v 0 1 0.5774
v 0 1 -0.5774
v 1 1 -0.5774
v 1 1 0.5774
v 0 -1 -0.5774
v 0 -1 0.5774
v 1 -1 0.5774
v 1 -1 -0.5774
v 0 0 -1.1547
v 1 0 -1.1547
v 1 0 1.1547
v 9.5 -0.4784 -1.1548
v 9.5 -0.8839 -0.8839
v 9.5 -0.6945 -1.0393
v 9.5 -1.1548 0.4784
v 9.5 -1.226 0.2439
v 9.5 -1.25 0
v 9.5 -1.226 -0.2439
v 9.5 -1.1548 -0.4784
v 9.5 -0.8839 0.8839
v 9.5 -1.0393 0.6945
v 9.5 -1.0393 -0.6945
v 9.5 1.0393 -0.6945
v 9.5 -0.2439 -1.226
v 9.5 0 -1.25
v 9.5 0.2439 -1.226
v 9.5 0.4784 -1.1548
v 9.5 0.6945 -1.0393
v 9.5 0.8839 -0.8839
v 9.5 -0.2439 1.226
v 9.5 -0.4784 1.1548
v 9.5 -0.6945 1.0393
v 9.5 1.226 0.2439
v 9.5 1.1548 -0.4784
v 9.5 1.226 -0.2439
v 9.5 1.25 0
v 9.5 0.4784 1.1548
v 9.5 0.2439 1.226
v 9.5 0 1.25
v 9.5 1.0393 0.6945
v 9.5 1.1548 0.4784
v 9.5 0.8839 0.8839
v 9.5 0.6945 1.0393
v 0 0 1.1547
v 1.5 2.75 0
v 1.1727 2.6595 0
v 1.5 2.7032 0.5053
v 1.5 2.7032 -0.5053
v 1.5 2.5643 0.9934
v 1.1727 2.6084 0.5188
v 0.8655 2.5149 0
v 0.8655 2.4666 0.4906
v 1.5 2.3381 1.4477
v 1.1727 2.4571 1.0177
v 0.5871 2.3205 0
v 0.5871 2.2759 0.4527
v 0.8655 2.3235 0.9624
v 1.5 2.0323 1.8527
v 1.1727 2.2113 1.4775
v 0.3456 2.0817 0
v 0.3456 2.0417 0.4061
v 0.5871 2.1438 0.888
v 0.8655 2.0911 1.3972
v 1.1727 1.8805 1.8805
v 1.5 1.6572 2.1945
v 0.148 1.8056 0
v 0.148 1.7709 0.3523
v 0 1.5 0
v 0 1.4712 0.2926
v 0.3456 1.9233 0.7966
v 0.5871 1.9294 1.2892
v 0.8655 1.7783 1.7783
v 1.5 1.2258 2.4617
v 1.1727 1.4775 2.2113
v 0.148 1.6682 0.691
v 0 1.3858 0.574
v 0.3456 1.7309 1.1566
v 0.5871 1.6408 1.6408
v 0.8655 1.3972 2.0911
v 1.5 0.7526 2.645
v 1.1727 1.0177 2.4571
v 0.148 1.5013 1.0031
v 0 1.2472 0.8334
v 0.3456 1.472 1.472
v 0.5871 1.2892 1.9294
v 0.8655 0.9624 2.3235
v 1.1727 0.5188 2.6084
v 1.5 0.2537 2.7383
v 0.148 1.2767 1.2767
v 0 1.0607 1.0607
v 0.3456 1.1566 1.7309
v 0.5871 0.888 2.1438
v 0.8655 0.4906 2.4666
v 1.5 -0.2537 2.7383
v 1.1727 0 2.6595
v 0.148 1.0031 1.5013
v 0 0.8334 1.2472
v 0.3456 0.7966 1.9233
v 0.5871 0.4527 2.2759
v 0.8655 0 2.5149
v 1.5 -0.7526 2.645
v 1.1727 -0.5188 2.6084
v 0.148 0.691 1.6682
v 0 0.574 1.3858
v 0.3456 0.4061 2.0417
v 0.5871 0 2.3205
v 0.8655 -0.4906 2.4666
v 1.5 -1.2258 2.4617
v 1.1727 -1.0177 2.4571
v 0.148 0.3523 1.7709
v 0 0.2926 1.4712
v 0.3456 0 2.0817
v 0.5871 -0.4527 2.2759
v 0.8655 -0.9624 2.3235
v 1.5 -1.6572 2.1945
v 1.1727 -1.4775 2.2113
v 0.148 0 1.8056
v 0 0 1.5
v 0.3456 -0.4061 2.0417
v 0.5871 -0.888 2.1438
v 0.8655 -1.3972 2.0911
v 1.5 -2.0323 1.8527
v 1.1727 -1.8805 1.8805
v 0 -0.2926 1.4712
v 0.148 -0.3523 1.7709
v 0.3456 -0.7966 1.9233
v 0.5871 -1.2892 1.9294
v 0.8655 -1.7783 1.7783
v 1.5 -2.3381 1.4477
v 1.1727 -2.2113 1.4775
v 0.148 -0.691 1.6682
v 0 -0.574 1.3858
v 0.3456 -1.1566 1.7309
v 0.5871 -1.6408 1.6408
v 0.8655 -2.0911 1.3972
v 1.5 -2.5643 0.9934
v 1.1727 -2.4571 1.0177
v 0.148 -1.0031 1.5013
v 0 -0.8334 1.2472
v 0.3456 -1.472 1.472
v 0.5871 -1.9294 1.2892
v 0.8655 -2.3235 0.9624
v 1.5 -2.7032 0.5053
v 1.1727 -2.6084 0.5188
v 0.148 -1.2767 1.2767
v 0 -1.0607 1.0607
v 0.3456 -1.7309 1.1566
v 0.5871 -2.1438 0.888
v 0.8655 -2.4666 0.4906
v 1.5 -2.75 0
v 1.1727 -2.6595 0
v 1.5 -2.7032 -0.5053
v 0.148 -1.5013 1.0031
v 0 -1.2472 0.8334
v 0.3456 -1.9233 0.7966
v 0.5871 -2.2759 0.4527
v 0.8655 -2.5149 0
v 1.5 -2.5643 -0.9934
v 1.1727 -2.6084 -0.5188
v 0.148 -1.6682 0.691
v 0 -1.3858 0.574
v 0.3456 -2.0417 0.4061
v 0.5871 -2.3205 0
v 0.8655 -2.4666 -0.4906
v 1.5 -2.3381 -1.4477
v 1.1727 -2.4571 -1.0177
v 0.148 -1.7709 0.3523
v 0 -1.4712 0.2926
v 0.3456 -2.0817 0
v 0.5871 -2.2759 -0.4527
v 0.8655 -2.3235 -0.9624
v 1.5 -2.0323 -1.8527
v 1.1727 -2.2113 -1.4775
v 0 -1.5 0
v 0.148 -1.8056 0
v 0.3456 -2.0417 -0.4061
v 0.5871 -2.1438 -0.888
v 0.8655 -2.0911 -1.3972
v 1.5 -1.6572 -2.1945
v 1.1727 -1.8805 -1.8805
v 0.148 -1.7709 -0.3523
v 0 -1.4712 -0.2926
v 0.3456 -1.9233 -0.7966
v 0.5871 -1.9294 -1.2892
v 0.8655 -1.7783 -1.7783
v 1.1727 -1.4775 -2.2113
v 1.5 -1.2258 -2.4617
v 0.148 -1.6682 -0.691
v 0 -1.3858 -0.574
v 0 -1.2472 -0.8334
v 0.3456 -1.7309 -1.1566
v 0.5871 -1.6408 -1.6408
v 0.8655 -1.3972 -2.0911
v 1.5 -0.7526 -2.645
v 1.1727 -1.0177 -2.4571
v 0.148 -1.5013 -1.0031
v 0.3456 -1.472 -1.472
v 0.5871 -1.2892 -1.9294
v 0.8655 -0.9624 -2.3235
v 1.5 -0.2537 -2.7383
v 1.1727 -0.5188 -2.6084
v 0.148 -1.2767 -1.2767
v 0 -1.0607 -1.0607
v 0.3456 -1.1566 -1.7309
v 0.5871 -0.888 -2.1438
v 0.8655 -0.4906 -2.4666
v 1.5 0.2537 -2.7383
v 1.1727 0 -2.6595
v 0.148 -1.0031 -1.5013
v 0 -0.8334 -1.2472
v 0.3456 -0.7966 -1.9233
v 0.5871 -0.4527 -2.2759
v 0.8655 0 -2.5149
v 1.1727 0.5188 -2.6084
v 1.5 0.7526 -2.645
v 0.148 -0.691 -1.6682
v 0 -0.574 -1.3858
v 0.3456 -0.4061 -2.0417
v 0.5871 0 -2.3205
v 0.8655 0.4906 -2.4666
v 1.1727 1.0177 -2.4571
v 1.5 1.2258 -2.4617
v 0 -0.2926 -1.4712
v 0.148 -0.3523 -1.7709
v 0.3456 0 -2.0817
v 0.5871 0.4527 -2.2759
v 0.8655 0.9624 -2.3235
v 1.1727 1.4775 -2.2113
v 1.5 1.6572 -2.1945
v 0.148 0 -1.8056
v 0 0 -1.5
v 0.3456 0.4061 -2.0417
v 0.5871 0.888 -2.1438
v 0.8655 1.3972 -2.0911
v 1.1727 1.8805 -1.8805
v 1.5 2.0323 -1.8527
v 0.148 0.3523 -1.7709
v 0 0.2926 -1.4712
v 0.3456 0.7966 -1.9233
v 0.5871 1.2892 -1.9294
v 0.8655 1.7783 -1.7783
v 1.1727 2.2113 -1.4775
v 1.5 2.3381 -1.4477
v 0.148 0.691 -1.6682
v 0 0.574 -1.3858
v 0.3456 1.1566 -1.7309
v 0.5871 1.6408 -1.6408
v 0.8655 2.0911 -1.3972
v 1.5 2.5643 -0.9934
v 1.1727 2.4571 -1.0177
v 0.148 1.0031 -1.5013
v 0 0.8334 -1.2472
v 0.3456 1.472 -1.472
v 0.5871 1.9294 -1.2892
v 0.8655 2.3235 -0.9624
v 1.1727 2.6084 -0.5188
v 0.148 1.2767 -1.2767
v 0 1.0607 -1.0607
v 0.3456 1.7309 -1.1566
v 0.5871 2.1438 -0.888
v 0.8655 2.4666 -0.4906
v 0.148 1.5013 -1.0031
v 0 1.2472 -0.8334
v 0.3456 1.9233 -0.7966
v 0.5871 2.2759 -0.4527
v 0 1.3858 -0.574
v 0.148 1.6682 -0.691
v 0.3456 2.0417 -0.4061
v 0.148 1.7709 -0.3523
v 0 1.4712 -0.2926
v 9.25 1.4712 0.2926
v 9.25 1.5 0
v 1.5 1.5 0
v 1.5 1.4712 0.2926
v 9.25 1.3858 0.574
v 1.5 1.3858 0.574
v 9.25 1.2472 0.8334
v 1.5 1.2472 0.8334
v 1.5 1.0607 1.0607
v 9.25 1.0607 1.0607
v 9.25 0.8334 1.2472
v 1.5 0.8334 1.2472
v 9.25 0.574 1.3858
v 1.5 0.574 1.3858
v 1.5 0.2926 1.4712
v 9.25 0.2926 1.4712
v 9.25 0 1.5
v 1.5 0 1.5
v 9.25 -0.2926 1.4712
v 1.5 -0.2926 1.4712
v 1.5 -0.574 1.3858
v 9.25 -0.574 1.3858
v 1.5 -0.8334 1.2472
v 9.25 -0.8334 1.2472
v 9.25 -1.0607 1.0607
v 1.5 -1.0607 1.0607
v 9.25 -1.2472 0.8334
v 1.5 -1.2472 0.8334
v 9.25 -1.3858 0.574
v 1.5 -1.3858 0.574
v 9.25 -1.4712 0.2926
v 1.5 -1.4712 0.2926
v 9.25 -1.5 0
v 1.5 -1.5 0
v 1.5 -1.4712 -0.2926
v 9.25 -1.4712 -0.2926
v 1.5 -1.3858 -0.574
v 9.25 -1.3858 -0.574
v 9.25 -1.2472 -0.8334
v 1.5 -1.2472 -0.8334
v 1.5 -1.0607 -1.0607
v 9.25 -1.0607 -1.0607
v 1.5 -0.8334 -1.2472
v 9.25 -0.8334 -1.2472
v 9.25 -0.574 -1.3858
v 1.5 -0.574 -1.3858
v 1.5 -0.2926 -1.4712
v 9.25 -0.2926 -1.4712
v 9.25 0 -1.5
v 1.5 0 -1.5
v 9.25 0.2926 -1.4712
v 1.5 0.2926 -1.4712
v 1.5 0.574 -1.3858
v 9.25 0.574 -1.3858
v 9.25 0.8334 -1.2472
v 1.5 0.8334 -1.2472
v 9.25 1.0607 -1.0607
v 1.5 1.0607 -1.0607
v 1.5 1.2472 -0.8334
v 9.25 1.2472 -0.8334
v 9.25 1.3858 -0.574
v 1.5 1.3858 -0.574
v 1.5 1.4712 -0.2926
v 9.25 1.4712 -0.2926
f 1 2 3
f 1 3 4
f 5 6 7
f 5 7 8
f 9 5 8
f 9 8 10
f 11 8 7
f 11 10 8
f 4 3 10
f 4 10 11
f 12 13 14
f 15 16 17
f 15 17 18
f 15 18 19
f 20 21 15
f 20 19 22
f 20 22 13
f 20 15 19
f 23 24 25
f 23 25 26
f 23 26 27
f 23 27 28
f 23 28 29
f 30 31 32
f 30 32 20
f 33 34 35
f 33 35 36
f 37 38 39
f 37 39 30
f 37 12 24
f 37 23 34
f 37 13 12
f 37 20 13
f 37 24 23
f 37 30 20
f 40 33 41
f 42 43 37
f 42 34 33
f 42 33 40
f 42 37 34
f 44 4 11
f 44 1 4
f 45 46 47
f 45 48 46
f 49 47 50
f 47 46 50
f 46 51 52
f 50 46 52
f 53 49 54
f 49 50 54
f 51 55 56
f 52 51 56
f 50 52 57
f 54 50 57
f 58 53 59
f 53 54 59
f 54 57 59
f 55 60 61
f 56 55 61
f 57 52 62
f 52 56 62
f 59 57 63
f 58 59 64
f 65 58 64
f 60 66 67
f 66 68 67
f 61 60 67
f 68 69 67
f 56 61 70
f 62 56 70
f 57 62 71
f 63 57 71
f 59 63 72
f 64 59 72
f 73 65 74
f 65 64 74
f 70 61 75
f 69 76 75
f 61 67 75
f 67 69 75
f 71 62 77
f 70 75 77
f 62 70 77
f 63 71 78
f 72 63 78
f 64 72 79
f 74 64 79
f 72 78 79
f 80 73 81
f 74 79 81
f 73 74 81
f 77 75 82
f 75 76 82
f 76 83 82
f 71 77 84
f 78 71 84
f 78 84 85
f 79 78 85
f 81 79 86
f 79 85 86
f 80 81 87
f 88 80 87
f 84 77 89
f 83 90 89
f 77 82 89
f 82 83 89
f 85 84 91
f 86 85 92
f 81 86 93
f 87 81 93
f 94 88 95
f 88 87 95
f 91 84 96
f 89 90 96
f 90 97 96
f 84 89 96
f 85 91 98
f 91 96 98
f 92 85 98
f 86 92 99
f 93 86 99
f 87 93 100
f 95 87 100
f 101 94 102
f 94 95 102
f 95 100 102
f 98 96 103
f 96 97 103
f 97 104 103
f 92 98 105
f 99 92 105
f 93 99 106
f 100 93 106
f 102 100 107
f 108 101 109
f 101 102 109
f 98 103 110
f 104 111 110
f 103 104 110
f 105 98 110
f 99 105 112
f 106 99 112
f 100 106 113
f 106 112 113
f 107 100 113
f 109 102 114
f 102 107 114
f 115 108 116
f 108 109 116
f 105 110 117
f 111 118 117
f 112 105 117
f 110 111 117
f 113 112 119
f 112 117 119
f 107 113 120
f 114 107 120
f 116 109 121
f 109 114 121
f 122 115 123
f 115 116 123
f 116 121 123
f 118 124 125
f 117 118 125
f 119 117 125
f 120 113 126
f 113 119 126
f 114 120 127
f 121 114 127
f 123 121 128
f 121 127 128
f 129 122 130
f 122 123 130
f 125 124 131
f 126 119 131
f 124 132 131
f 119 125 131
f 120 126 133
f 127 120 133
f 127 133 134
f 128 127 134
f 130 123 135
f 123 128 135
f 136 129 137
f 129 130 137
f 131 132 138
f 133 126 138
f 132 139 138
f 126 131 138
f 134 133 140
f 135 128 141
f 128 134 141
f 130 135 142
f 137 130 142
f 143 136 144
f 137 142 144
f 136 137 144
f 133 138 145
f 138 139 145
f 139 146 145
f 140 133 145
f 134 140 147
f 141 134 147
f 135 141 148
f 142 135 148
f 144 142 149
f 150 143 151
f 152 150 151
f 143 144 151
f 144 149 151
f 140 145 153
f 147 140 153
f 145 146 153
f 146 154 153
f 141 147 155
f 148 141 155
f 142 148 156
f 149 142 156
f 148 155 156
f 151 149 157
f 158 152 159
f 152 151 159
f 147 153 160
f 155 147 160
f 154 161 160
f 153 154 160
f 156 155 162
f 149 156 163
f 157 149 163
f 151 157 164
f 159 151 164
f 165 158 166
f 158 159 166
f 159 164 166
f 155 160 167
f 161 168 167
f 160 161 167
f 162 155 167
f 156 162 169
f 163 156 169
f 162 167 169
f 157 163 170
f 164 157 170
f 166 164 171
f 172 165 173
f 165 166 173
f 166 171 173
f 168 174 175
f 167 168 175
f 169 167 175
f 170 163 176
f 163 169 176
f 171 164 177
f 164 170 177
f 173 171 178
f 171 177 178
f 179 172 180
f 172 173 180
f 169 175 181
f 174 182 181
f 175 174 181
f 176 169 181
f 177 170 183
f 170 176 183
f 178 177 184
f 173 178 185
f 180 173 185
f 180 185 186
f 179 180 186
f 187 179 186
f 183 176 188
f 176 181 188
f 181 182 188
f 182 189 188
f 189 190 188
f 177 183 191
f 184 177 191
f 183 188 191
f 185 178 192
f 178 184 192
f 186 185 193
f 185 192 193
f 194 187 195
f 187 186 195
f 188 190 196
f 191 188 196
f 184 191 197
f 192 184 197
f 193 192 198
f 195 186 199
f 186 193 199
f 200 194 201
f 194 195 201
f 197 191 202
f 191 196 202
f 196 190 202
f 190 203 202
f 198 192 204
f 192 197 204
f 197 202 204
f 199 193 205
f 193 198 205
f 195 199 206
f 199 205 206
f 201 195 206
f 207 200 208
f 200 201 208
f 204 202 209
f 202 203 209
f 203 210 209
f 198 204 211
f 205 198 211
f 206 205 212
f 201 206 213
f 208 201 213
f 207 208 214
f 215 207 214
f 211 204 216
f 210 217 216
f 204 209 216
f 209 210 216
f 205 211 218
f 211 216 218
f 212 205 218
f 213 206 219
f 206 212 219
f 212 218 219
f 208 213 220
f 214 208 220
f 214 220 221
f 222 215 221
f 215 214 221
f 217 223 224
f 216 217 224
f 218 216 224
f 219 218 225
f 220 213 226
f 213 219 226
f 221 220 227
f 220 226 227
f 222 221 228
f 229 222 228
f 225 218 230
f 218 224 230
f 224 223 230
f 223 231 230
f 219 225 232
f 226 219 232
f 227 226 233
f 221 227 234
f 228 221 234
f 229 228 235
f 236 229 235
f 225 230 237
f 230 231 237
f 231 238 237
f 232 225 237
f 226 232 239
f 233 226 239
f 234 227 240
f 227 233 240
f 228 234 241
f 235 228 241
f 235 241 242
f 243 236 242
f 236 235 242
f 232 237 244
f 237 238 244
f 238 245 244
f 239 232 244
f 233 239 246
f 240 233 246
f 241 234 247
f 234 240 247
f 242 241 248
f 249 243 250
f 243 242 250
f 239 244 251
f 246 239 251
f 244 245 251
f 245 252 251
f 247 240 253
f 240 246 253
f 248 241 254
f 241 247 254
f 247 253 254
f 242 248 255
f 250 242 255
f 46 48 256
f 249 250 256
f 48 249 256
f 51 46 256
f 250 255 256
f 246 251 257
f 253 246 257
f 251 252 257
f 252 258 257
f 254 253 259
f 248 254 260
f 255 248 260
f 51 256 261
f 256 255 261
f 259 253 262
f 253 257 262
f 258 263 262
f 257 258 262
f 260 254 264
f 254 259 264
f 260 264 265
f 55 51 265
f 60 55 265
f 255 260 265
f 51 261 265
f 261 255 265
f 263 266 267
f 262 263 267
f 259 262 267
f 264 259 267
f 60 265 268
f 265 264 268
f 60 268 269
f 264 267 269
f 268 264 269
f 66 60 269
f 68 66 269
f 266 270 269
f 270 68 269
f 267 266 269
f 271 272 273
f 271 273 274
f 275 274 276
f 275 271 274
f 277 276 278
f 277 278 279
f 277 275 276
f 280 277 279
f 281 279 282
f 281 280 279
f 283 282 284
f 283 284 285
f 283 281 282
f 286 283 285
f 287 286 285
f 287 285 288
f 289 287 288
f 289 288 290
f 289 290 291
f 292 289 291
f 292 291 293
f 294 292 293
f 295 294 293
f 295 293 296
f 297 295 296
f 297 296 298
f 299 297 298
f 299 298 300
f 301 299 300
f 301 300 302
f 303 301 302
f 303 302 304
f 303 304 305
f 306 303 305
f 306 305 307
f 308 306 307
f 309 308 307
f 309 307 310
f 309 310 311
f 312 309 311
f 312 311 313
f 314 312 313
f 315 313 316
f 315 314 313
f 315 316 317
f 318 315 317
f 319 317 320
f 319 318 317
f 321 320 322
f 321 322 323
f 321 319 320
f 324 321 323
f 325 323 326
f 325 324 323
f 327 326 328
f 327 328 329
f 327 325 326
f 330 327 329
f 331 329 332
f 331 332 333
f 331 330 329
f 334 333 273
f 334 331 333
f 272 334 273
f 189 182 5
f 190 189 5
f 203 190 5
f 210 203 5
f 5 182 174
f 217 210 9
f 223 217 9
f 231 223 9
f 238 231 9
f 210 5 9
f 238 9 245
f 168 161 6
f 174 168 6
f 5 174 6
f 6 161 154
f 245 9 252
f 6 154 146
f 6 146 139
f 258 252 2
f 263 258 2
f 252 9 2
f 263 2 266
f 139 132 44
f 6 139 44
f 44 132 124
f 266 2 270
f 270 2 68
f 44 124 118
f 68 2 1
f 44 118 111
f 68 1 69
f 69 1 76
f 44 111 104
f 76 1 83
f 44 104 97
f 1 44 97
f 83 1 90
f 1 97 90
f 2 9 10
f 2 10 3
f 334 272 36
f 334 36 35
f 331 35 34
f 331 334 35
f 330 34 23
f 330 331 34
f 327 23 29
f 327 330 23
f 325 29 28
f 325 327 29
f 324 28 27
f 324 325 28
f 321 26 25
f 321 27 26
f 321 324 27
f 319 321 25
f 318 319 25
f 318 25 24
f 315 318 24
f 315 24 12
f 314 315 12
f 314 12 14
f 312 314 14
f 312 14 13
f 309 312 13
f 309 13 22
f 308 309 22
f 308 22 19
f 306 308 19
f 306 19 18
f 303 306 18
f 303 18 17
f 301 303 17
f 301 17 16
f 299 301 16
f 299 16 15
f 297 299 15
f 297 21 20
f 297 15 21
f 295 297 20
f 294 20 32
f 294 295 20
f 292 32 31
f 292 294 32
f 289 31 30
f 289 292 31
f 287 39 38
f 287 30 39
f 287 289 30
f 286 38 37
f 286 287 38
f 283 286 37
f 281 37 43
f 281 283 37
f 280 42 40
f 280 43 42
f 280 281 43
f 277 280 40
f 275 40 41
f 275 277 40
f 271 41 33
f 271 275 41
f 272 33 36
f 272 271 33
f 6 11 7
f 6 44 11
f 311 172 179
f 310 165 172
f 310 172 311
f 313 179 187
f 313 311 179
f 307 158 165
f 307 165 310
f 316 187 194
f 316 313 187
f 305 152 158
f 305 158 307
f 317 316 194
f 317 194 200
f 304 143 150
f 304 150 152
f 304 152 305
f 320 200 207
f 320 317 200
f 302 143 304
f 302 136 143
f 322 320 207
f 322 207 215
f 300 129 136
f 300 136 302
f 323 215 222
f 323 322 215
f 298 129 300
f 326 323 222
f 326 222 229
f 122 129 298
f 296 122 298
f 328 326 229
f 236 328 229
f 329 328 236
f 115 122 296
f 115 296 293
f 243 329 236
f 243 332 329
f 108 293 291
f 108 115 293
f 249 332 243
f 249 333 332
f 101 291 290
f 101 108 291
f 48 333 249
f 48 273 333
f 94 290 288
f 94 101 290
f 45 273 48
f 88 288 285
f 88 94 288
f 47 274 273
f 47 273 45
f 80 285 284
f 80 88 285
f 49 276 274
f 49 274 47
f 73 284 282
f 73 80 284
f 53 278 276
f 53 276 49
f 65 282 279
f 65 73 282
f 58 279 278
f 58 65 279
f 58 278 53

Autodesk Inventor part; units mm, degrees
ref_plane "YZ Plane" through (0, 0, 0) normal (1, 0, 0) x (0, 1, 0)
ref_plane "XZ Plane" through (0, 0, 0) normal (0, 1, 0) x (-1, 0, 0)
ref_plane "XY Plane" through (0, 0, 0) normal (0, 0, 1) x (1, 0, 0)
sketch "Sketch1" plane through (0, 0, 0) normal (0, 0, 1) x (1, 0, 0)
  line L0 (0, 0) -> (9.5, 0)
  line L1 (0, 0) -> (0, 1.5)
  arc A0 (1.5, 2.75) -> (0, 1.5) centre (1.8675, 0.784) ccw
  line L2 (1.5, 2.75) -> (1.5, 1.5)
  line L3 (1.5, 1.5) -> (9.5, 1.5)
  line L4 (9.5, 1.5) -> (9.5, 0)
  dimension "d0" = 1.5
  dimension "d1" = 3
  dimension "d2" = 5.5
  dimension "d3" = 3
  dimension "d4" = 8
  dimension "d5" = 2
revolve "Revolution1" add sketch "Sketch1" angle 360 about axis through (0, 0, 0) along (1, 0, 0)
sketch "Sketch2" plane through (0, 0, 0) normal (-1, 0, 0) x (0, 0, 1)
  line L0 (0.5774, 1) -> (1.1547, 0)
  line L1 (1.1547, 0) -> (0.5774, -1)
  line L2 (0.5774, -1) -> (-0.5774, -1)
  line L3 (-0.5774, -1) -> (-1.1547, 0)
  line L4 (-1.1547, 0) -> (-0.5774, 1)
  line L5 (-0.5774, 1) -> (0.5774, 1)
  point P0 (0, 0)
  point P1 (0, 0)
  dimension "d7" = 2
extrude "Extrusion1" cut sketch "Sketch2" against normal blind 1
thread "Thread1" size "M3x0.5" class "6g" standard "ANSI Metric M Profile" full length
chamfer "Chamfer1" distance 0.25 angle 45 1 edges at (9.5, -1.5, 0)
properties part number "M3 X 8mm BHCS"
